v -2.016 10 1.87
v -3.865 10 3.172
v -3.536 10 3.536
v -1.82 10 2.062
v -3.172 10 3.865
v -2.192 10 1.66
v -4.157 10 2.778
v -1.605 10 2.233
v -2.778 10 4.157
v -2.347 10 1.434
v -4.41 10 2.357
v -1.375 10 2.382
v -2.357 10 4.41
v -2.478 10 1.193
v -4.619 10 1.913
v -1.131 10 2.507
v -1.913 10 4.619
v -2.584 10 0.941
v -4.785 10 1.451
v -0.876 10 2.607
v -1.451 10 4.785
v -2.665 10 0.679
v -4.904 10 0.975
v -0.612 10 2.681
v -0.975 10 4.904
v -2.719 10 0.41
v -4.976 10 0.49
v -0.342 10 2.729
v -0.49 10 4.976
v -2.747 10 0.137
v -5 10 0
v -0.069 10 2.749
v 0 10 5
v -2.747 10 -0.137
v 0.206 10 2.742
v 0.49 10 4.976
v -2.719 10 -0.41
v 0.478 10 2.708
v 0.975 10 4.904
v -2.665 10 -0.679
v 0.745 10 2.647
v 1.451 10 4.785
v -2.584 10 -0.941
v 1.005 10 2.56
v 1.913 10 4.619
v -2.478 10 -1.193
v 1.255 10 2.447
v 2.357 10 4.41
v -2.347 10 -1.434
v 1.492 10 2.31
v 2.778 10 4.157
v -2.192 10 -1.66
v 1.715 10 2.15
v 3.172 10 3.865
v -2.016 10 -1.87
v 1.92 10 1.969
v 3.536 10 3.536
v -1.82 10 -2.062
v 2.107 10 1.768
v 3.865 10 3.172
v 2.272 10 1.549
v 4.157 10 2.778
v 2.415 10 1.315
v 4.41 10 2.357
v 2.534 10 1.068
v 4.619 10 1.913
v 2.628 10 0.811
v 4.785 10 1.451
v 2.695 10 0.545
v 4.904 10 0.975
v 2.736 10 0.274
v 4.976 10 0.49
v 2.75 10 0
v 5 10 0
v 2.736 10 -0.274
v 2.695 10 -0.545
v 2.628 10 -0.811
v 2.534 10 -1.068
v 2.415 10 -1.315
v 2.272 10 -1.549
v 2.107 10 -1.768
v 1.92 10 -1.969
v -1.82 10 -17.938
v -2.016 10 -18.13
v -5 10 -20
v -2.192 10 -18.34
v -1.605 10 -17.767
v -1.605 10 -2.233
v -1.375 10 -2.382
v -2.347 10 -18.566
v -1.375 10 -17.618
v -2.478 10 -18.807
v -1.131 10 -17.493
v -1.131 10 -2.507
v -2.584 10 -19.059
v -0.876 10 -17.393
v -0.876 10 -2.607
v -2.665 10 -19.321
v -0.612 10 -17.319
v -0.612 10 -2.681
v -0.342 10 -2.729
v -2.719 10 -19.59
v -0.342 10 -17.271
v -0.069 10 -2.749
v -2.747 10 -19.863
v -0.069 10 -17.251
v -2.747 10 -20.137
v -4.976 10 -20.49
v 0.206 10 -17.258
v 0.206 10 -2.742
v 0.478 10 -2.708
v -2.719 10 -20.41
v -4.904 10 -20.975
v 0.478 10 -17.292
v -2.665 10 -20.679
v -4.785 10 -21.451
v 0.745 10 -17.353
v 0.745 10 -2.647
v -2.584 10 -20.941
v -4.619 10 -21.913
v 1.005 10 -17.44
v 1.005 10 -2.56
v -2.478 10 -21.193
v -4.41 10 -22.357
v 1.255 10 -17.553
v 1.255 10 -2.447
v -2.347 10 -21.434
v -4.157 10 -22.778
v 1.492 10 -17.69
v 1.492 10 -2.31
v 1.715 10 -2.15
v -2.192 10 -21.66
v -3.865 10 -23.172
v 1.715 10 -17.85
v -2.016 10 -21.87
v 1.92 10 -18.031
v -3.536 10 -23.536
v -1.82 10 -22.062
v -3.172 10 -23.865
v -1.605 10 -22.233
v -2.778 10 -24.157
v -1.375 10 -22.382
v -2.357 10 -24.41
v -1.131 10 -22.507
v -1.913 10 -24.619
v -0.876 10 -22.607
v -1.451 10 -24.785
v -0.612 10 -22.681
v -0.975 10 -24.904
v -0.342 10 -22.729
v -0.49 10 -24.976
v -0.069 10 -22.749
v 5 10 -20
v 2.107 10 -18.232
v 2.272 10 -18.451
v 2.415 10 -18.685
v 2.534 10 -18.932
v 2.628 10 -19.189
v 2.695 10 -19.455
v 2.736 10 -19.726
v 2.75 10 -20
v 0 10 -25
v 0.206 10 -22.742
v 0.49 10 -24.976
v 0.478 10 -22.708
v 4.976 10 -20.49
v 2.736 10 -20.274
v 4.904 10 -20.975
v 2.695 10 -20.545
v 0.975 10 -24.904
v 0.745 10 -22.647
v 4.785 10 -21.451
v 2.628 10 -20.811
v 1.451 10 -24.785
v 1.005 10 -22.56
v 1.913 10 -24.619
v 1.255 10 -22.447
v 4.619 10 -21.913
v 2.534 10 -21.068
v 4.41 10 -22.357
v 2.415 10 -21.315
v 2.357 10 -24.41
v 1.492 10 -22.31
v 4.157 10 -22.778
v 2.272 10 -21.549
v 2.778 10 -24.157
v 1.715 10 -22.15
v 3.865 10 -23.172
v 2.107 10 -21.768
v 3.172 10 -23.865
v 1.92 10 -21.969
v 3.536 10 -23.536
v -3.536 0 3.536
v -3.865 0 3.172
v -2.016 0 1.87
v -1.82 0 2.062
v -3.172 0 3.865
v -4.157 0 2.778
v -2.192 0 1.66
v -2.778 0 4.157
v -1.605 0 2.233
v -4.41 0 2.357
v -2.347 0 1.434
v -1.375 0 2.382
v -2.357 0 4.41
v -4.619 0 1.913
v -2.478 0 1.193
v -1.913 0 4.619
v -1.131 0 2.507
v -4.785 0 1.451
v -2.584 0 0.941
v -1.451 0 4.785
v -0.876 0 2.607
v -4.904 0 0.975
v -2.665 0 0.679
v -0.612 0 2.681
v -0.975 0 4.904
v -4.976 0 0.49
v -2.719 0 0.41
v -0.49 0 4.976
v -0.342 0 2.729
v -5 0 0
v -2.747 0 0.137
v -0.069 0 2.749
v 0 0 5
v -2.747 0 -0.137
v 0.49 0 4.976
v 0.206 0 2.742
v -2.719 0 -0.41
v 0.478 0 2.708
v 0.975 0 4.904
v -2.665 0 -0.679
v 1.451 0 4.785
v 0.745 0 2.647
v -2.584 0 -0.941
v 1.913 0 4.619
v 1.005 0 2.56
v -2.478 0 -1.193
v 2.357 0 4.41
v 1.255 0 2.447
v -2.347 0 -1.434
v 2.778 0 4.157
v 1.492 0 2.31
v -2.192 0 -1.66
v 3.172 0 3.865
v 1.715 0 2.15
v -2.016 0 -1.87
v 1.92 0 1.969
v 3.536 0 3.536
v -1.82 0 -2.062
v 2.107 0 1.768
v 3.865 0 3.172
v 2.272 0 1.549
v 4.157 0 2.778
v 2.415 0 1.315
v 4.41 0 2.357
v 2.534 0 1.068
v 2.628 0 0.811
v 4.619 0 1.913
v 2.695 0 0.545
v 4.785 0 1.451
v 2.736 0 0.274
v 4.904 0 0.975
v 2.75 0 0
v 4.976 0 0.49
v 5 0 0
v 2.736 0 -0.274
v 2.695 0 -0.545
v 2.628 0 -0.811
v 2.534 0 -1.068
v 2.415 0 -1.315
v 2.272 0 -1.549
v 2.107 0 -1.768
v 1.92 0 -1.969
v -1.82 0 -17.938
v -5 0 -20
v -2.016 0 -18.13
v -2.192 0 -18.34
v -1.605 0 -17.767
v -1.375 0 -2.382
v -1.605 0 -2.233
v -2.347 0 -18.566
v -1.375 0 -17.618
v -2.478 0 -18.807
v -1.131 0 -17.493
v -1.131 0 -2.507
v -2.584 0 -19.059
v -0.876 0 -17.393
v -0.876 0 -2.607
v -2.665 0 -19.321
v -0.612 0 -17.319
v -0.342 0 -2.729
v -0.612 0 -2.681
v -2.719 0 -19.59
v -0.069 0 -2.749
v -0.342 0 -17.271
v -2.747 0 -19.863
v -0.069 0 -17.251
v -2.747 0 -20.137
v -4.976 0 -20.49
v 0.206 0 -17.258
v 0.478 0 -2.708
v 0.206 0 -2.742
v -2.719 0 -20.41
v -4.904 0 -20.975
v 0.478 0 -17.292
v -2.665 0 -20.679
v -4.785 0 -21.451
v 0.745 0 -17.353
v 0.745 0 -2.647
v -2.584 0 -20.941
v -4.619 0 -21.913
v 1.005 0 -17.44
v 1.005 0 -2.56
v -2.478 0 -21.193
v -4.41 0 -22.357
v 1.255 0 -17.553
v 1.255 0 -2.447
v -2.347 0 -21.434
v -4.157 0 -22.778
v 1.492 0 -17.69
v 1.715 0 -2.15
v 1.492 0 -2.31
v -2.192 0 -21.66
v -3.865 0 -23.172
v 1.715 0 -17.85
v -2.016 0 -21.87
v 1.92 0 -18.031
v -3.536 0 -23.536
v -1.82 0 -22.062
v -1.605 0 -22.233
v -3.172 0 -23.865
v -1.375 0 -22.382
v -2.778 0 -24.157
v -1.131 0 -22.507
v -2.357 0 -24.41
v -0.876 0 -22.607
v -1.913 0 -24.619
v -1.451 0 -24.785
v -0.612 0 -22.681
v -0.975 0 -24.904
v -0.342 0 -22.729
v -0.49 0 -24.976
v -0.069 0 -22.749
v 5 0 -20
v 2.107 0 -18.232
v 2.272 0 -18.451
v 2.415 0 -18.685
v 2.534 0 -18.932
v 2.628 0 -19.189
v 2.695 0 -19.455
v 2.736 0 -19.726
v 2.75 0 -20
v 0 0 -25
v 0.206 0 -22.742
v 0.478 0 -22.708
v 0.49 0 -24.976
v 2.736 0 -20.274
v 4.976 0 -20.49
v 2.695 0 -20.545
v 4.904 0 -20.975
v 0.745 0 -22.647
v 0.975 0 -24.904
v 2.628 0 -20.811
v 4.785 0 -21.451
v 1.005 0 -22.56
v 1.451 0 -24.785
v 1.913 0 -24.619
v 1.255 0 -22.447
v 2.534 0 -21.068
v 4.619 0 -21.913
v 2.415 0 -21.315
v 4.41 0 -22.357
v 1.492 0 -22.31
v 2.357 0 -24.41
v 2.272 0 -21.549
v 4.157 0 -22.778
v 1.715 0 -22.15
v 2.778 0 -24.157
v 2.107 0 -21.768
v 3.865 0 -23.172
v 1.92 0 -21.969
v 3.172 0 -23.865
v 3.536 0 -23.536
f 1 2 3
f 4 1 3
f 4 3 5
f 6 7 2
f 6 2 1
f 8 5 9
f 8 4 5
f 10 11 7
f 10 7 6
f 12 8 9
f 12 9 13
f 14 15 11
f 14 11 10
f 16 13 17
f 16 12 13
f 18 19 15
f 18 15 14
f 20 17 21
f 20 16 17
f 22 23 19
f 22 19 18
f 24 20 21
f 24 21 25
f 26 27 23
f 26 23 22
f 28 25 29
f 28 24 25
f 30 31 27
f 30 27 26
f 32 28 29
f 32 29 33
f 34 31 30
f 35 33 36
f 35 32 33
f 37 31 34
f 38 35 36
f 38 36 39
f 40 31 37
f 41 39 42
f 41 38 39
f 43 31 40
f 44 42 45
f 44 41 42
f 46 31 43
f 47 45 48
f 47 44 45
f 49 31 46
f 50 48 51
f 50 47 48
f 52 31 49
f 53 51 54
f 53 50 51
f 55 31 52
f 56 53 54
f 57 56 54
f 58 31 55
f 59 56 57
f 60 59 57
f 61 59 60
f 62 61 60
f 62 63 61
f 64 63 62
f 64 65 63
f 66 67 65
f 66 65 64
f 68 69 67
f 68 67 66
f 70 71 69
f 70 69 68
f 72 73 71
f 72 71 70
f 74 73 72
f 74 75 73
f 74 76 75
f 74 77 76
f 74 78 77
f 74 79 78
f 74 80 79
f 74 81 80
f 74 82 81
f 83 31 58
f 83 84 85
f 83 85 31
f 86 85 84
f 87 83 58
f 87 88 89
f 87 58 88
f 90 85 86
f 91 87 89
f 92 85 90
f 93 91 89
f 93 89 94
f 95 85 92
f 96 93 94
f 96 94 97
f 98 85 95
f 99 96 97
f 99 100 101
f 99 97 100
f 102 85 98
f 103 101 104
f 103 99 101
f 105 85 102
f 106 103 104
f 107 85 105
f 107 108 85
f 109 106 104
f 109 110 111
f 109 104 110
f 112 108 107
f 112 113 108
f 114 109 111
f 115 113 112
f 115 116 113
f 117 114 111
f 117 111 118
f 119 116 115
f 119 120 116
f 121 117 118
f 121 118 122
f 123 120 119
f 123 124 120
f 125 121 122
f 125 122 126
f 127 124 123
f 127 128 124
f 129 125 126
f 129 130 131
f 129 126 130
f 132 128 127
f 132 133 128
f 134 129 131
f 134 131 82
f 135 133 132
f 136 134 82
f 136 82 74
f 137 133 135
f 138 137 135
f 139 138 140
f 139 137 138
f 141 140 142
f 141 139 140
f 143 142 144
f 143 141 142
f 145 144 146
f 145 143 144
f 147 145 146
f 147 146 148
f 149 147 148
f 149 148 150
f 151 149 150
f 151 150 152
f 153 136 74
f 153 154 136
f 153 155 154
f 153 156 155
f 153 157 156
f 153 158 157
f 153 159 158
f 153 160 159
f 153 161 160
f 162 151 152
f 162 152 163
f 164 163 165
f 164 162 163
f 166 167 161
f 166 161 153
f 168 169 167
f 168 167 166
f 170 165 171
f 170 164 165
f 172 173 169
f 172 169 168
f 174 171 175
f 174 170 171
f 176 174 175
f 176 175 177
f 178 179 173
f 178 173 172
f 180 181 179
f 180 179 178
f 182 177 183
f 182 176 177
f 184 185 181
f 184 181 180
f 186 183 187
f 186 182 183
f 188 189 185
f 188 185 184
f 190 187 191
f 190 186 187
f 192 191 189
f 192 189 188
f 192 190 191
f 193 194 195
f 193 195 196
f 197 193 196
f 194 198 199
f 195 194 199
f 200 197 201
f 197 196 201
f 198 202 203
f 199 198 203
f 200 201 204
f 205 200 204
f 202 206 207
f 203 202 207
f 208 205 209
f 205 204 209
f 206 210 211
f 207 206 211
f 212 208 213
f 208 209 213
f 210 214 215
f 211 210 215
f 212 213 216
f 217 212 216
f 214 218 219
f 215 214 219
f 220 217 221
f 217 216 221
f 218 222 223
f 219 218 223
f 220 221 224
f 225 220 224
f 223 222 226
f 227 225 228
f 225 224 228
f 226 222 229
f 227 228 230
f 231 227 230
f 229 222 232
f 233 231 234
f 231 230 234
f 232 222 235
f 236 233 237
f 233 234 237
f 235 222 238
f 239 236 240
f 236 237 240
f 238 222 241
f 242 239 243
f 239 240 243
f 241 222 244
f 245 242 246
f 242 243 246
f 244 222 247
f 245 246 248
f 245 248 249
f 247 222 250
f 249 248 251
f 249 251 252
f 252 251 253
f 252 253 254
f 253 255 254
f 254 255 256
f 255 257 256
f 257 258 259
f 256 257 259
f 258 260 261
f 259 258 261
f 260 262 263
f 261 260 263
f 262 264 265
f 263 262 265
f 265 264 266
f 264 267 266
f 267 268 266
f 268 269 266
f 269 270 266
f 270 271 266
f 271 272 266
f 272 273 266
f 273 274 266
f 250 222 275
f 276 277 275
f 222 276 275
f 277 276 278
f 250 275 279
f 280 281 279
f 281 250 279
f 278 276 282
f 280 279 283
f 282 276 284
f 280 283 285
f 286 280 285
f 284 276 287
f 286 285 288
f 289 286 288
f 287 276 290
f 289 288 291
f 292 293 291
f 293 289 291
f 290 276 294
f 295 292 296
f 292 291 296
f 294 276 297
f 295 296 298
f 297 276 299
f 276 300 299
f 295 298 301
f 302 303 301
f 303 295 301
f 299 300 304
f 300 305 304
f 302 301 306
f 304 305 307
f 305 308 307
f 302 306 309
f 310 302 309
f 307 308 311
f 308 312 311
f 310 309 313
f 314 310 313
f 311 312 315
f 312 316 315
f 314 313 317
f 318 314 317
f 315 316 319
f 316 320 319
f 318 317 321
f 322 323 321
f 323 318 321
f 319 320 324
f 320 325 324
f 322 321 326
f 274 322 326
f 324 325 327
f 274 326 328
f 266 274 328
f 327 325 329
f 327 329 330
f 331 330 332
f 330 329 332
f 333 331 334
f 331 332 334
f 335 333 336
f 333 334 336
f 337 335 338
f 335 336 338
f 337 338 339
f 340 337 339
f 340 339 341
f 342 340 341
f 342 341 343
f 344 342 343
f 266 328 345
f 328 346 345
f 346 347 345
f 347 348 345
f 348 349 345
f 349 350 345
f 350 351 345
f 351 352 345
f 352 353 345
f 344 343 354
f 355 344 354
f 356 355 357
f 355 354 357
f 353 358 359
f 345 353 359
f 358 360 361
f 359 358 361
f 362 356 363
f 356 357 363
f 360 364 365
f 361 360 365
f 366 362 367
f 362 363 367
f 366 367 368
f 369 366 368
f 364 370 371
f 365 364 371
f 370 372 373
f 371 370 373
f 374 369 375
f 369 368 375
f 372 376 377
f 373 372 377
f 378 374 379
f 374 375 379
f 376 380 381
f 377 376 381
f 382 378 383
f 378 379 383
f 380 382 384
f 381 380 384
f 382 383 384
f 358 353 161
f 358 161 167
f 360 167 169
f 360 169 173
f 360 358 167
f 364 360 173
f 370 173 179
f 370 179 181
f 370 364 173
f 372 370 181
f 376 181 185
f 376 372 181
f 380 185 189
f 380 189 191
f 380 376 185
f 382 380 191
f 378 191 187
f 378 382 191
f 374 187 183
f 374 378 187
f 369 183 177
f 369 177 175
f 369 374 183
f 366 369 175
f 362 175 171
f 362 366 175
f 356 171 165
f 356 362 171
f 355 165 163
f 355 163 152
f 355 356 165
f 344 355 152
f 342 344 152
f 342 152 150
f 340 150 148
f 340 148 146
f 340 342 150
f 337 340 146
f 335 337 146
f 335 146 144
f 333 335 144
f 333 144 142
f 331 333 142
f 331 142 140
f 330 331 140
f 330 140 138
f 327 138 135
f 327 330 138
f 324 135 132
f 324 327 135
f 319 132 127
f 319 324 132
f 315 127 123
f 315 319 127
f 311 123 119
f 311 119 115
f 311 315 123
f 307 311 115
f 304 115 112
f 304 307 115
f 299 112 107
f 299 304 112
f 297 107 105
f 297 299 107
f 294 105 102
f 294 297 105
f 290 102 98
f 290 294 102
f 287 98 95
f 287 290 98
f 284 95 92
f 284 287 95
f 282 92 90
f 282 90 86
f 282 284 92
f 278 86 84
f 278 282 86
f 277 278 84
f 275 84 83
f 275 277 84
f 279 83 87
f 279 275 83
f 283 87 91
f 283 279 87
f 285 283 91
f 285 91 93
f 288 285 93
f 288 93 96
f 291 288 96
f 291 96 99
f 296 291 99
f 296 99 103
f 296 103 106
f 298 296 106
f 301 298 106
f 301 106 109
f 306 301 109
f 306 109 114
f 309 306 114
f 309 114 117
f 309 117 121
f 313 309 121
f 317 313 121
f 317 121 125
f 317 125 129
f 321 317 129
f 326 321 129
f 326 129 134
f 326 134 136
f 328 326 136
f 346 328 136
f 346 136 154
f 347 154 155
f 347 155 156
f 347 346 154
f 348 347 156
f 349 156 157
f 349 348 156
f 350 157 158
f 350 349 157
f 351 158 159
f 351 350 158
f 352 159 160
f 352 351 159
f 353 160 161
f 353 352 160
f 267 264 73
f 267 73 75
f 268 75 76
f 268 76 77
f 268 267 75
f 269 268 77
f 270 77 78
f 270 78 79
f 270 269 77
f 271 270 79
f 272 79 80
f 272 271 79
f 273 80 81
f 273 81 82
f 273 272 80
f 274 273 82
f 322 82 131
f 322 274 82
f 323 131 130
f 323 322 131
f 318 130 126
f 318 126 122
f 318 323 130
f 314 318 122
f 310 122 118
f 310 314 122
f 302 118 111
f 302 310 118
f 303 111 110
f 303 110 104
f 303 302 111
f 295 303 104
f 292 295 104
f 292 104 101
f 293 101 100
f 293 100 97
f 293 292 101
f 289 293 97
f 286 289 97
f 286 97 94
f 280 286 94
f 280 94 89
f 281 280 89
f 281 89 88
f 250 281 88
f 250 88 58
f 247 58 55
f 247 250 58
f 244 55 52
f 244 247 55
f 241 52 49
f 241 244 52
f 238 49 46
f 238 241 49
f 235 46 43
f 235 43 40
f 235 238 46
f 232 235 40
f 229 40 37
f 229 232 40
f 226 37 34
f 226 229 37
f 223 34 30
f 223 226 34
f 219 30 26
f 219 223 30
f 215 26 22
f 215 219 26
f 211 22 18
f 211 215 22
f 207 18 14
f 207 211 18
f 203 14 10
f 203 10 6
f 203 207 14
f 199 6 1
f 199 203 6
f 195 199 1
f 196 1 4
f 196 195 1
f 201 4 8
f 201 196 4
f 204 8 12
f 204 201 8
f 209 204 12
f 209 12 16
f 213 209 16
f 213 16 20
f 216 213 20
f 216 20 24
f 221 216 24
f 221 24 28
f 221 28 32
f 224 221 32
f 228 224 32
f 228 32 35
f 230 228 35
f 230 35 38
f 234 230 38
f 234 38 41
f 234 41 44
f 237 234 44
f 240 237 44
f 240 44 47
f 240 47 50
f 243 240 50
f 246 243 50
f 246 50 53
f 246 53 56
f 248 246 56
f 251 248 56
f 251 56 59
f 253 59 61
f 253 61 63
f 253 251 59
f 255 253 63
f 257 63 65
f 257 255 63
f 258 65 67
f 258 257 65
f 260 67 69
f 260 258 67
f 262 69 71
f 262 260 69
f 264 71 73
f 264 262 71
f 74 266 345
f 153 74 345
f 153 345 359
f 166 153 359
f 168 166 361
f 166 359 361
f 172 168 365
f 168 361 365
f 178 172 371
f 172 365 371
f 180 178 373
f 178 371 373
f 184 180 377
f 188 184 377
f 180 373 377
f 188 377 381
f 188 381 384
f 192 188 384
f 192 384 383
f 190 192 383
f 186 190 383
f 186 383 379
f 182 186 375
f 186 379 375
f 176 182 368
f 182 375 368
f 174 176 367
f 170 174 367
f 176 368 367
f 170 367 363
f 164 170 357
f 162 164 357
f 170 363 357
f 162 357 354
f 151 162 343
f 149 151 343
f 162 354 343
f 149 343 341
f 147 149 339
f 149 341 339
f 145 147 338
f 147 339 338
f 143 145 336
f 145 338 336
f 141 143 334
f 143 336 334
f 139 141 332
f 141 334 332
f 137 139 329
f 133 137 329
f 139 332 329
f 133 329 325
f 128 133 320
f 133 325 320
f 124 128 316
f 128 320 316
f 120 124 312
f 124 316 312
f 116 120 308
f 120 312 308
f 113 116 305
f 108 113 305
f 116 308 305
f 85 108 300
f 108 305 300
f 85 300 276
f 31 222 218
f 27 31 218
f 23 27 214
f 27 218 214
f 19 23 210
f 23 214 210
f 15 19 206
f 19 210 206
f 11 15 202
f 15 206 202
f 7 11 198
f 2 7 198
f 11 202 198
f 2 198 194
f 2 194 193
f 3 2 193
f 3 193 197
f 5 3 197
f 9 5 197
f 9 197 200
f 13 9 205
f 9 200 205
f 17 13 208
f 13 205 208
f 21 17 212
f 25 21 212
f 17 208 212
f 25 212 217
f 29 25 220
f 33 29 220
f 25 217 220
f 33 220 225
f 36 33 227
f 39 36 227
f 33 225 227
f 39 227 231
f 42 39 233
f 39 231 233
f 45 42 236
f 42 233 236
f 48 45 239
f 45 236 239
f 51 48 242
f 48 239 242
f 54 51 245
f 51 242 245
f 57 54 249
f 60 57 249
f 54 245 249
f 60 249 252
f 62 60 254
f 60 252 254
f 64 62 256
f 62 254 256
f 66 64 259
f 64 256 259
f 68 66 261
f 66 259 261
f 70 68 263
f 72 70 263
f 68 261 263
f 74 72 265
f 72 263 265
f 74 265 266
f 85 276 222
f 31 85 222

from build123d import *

# Parameters (mm, degrees)
SKETCH3_R           = 2.75
BOSS_EXTRUDE1_DEPTH = 10


with BuildPart() as part:
    # Sketch3 → Boss-Extrude1 (new body)
    with BuildSketch(Plane(origin=(0, 0, 0), x_dir=(1, 0, 0), z_dir=(0, 1, 0))):
        with BuildLine():
            ThreePointArc((-5, 0), (0, -5), (5, 0))
            Line((5, 0), (5, 20))
            ThreePointArc((5, 20), (0, 25), (-5, 20))
            Line((-5, 20), (-5, 0))
        make_face()
        Circle(SKETCH3_R, mode=Mode.SUBTRACT)
        with Locations((0, 20)):
            Circle(SKETCH3_R, mode=Mode.SUBTRACT)
    extrude(amount=BOSS_EXTRUDE1_DEPTH)


solid = part.part
